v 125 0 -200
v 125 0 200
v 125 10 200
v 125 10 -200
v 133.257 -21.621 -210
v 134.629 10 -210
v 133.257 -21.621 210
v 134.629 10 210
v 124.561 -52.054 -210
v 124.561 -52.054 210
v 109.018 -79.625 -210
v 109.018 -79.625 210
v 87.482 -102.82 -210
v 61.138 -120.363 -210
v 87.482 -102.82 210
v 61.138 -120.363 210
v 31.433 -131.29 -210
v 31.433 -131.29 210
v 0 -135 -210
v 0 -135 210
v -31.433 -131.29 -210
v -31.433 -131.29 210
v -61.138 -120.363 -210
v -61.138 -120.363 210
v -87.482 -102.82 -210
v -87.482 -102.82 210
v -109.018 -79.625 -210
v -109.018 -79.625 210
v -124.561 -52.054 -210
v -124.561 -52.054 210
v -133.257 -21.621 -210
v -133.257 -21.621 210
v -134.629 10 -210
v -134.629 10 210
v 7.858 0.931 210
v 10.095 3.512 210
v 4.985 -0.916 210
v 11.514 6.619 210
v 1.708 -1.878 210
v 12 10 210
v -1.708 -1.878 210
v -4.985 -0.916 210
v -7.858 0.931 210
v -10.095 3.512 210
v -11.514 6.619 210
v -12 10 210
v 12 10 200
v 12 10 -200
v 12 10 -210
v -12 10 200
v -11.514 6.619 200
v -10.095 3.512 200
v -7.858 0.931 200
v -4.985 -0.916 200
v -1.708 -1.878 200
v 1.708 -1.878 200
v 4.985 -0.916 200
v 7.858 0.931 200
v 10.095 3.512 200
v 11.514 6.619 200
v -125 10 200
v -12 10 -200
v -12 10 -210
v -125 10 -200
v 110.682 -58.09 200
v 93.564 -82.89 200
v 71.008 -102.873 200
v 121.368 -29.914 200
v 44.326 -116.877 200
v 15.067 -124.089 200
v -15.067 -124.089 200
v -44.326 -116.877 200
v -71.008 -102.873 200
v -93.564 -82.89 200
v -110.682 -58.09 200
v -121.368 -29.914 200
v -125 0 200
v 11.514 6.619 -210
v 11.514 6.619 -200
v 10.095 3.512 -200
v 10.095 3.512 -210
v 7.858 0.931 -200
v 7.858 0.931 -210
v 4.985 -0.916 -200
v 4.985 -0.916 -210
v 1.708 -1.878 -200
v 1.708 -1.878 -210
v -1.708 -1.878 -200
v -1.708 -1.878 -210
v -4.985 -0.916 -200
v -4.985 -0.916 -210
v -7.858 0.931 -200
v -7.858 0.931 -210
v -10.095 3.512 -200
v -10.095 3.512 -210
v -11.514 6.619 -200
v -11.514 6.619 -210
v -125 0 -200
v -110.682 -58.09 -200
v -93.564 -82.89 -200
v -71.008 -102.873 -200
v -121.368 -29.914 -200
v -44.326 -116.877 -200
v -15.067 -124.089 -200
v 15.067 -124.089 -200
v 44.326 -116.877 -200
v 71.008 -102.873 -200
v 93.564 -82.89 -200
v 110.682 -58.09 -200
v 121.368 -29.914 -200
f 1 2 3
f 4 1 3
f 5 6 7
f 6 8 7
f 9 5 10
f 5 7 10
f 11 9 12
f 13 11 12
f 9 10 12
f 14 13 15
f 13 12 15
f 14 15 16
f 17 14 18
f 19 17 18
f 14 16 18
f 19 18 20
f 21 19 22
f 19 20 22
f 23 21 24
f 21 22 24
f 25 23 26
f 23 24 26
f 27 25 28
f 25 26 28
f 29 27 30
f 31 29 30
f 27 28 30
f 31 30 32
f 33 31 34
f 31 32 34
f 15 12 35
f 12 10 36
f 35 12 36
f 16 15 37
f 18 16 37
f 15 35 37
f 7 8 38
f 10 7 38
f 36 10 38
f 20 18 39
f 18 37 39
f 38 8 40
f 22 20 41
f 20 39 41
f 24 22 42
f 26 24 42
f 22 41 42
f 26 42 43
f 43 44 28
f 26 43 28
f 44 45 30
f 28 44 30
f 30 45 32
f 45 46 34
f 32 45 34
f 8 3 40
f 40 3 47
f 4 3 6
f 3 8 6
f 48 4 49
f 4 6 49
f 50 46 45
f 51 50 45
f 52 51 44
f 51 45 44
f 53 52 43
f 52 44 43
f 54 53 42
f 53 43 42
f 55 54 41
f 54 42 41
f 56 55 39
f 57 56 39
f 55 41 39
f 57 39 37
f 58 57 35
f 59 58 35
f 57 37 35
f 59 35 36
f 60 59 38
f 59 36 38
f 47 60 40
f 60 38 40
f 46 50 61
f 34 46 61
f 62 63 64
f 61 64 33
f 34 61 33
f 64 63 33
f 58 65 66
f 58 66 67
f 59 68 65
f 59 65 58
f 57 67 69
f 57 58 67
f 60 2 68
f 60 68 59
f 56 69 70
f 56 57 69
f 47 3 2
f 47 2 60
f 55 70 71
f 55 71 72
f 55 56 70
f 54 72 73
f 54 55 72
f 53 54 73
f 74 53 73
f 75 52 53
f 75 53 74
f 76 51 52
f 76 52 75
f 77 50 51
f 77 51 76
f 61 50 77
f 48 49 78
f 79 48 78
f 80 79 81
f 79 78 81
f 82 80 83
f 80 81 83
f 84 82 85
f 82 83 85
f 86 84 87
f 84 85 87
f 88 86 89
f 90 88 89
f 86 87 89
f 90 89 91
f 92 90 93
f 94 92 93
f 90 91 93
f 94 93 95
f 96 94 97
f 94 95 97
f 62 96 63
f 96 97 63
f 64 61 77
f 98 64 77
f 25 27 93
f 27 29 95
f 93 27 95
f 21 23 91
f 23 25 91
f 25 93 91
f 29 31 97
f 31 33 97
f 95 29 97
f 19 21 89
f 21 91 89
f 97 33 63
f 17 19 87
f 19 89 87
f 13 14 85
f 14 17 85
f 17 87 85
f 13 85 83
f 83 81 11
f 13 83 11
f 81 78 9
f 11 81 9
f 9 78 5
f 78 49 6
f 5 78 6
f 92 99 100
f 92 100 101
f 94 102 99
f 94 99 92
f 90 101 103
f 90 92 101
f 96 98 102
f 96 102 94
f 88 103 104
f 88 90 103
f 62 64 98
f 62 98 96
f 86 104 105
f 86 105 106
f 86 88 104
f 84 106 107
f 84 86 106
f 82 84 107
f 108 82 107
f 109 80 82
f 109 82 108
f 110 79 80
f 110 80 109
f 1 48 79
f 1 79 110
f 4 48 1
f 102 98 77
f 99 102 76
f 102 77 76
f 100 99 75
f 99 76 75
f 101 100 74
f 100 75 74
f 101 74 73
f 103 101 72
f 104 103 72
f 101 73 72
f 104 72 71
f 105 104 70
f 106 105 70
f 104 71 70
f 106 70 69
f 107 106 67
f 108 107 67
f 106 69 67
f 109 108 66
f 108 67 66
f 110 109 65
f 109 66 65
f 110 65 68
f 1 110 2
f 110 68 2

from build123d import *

# Parameters (mm, degrees)
BOSS_EXTRUDE1_DEPTH = 210
BOSS_EXTRUDE2_START = 210
BOSS_EXTRUDE2_DEPTH = 10
BOSS_EXTRUDE3_START = -210
BOSS_EXTRUDE3_DEPTH = 10


with BuildPart() as part:
    # Sketch1 → Boss-Extrude1 (new body, symmetric)
    with BuildSketch(Plane.XY):
        with BuildLine():
            Line((-134.629120178, 10), (-125, 10))
            Line((-125, 10), (-125, 0))
            ThreePointArc((-125, 0), (0, -125), (125, 0))
            Line((125, 0), (125, 10))
            Line((125, 10), (134.629120178, 10))
            ThreePointArc((134.629120178, 10), (0, -135), (-134.629120178, 10))
        make_face()
    extrude(amount=BOSS_EXTRUDE1_DEPTH, both=True)

    # Sketch2 → Boss-Extrude2 (add)
    with BuildSketch(Plane.XY.offset(BOSS_EXTRUDE2_START)):
        with BuildLine():
            Line((-125, 10), (-12, 10))
            ThreePointArc((-12, 10), (0, -2), (12, 10))
            Line((12, 10), (125, 10))
            Line((125, 10), (125, 0))
            ThreePointArc((125, 0), (0, -125), (-125, 0))
            Line((-125, 0), (-125, 10))
        make_face()
    extrude(amount=-BOSS_EXTRUDE2_DEPTH)

    # Sketch2<2> → Boss-Extrude3 (add)
    with BuildSketch(Plane.XY.offset(BOSS_EXTRUDE3_START)):
        with BuildLine():
            Line((-12, 10), (-125, 10))
            Line((-125, 10), (-125, 0))
            ThreePointArc((-125, 0), (0, -125), (125, 0))
            Line((125, 0), (125, 10))
            Line((125, 10), (12, 10))
            ThreePointArc((12, 10), (0, -2), (-12, 10))
        make_face()
        with BuildLine():
            Line((-125, 0), (-125, 10))
            Line((-125, 10), (-134.629120178, 10))
            ThreePointArc((-134.629120178, 10), (0, -135), (134.629120178, 10))
            Line((134.629120178, 10), (125, 10))
            Line((125, 10), (125, 0))
            ThreePointArc((125, 0), (0, -125), (-125, 0))
        make_face()
    extrude(amount=BOSS_EXTRUDE3_DEPTH)


solid = part.part
